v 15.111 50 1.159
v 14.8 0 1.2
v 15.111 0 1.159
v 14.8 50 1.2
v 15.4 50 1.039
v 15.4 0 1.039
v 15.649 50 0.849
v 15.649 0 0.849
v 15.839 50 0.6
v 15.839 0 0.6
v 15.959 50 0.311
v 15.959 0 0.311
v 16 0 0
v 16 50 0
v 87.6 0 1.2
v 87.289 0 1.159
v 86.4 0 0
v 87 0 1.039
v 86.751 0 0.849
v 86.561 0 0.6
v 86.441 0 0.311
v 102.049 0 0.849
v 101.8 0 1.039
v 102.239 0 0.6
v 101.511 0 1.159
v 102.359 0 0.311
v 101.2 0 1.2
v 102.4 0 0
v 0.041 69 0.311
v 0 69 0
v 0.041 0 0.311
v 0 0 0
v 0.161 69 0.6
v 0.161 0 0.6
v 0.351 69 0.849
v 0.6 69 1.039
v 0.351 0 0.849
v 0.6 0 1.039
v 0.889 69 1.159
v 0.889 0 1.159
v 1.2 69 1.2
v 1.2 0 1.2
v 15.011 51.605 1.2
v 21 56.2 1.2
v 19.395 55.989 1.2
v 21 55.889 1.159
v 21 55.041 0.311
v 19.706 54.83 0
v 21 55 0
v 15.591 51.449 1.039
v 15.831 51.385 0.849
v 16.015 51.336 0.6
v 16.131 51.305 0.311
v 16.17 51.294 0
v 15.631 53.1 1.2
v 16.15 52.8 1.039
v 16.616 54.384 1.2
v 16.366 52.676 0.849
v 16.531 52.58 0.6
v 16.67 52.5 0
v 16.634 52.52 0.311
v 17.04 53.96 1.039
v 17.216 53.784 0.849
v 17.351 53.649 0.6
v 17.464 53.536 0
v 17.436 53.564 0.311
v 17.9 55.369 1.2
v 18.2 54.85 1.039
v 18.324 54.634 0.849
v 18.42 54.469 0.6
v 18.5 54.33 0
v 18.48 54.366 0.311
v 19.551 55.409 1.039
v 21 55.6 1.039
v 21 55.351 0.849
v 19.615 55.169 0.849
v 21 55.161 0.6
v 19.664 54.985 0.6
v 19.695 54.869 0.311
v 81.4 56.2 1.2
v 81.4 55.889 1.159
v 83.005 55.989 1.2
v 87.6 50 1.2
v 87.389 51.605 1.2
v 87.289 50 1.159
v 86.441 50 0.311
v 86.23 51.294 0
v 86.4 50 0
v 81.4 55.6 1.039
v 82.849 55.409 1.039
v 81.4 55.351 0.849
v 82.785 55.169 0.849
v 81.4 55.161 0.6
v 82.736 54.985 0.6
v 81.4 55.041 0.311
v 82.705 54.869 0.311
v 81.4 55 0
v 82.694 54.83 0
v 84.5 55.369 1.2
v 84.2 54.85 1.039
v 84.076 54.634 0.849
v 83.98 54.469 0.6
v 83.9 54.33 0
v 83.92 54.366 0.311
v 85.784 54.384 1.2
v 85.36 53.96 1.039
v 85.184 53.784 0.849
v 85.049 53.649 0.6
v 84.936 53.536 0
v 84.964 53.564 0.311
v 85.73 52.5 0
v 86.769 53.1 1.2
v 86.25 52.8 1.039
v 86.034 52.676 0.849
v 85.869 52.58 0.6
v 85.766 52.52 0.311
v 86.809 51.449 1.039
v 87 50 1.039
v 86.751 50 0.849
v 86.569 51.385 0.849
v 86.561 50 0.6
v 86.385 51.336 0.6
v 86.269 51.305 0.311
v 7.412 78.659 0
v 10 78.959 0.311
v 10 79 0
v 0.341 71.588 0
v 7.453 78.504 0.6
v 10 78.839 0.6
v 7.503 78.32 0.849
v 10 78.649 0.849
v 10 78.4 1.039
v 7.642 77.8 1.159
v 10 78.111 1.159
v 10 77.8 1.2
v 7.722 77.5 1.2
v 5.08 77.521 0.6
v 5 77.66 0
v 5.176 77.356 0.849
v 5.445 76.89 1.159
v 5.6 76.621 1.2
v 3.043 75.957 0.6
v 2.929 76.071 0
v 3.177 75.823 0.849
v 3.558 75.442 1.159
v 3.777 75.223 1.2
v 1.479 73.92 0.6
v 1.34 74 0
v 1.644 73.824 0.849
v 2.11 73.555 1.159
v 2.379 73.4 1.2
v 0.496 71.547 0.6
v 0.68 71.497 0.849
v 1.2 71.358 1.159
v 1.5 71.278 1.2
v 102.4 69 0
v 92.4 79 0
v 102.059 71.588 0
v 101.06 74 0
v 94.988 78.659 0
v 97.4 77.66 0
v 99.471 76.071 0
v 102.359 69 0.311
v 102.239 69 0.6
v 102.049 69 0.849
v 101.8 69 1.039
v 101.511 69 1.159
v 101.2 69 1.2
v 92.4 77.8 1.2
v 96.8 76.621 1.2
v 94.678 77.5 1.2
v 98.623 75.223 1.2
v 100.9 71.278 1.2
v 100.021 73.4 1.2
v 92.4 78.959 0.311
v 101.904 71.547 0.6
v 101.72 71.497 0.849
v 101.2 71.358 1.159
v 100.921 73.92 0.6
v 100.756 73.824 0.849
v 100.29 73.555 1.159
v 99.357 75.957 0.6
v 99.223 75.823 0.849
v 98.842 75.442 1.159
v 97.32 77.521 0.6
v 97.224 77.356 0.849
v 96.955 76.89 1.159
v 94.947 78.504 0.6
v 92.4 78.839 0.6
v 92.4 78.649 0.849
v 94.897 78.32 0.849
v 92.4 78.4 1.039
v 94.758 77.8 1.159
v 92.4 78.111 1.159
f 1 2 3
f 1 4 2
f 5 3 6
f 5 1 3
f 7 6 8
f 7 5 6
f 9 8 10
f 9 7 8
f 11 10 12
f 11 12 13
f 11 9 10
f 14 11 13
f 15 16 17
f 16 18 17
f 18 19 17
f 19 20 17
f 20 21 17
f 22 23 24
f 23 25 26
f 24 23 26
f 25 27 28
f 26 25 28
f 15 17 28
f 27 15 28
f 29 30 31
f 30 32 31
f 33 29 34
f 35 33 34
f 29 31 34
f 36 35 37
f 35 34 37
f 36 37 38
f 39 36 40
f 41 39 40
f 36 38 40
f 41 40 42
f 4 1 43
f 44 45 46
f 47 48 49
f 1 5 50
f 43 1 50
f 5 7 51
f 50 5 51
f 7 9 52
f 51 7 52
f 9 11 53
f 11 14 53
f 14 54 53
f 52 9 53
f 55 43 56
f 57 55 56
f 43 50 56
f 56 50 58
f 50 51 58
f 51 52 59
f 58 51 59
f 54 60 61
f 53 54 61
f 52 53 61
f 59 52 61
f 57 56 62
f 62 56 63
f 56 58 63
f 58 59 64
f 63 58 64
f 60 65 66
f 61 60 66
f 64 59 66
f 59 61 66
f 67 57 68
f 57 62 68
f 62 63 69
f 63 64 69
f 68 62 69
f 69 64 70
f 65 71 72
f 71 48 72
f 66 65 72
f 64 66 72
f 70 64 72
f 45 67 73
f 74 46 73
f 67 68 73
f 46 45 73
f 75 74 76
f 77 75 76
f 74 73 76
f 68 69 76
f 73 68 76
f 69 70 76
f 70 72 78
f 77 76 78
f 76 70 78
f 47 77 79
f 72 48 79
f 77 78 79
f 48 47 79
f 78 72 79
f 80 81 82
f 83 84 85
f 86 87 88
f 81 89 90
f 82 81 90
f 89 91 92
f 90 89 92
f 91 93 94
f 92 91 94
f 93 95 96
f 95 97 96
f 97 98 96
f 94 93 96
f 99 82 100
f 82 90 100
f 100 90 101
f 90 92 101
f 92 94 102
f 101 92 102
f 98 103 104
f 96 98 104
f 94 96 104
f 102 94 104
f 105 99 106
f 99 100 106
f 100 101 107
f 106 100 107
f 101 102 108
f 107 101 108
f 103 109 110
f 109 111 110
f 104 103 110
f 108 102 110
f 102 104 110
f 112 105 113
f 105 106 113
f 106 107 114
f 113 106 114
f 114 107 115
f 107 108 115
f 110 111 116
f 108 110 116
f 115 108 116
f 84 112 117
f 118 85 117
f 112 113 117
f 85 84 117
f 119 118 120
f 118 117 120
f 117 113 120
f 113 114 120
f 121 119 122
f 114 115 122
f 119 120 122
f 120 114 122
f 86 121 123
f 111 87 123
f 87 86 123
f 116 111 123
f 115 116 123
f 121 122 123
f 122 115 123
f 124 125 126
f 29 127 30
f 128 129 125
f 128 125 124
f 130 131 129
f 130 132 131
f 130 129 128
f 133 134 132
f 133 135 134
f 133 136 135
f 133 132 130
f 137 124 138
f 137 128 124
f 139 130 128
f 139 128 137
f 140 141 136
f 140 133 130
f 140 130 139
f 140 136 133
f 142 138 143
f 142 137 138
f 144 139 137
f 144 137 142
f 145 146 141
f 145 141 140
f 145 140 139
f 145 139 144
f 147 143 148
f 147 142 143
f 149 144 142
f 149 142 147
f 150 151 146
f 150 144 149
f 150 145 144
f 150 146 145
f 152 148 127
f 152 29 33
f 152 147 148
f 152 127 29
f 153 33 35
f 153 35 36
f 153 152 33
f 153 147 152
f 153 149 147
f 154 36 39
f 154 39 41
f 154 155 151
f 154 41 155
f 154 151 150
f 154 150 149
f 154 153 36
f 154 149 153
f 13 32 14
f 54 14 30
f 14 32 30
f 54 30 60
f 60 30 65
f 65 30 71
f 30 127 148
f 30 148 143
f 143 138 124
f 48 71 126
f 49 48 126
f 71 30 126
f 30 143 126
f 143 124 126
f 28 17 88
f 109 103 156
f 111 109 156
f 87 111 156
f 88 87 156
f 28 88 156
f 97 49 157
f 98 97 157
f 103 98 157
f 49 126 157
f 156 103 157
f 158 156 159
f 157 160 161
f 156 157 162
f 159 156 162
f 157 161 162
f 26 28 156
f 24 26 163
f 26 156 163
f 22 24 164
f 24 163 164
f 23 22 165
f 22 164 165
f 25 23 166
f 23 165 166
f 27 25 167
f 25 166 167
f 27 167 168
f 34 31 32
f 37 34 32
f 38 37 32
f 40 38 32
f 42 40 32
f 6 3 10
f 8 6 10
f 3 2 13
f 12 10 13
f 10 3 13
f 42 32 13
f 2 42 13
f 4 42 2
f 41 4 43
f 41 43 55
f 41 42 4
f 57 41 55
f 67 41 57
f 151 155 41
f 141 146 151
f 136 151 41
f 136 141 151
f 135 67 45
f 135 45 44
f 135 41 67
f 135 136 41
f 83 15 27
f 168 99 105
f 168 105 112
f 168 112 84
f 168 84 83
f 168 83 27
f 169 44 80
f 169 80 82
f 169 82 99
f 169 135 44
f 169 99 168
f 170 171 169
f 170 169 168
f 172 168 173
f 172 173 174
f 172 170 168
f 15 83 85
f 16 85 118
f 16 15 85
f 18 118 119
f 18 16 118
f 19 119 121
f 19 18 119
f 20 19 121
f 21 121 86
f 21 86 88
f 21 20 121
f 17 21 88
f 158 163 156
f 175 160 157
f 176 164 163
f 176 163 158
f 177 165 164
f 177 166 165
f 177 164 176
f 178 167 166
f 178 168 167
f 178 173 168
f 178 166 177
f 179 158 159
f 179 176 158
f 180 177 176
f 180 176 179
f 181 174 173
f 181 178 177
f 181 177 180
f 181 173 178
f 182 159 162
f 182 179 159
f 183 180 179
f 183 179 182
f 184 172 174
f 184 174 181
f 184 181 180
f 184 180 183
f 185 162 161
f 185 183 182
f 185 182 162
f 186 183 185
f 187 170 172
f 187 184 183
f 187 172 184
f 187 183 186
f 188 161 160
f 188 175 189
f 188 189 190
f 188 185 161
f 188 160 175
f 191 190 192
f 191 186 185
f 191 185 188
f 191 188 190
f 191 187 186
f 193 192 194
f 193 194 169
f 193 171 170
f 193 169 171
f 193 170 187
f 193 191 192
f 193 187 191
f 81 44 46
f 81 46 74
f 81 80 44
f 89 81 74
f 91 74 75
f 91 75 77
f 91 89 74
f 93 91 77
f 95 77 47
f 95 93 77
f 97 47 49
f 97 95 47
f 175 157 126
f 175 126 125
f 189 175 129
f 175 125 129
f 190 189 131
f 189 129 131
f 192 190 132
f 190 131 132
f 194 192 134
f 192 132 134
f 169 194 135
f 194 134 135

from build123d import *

# Parameters (mm, degrees)
AUFSATZ_LINEAR_AUSTRAGEN1_DEPTH = 1.2
VERRUNDUNG1_R                   = 10
VERRUNDUNG2_R                   = 5
VERRUNDUNG3_R                   = 1.2
VERRUNDUNG4_R                   = 1.2


with BuildPart() as part:
    # Skizze1 → Aufsatz-Linear austragen1 (new body)
    with BuildSketch(Plane.XY):
        Polygon((0, 79), (0, 0), (16, 0), (16, 55), (86.4, 55), (86.4, 0), (102.4, 0), (102.4, 79), align=None)
    extrude(amount=AUFSATZ_LINEAR_AUSTRAGEN1_DEPTH)

    # Verrundung1
    verrundung1_edges = [part.edges().sort_by_distance(p)[0] for p in [
        (0, 79, 0.6),
        (102.4, 79, 0.6),
    ]]
    fillet(verrundung1_edges, radius=VERRUNDUNG1_R)

    # Verrundung2
    verrundung2_edges = [part.edges().sort_by_distance(p)[0] for p in [
        (86.4, 55, 0.6),
        (16, 55, 0.6),
    ]]
    fillet(verrundung2_edges, radius=VERRUNDUNG2_R)

    # Verrundung3
    verrundung3_edges = [part.edges().sort_by_distance(p)[0] for p in [
        (102.4, 34.5, 1.2),
        (99.471067812, 76.071067812, 1.2),
        (51.2, 79, 1.2),
        (2.928932188, 76.071067812, 1.2),
        (0, 34.5, 1.2),
    ]]
    fillet(verrundung3_edges, radius=VERRUNDUNG3_R - 0.0001)  # a hair under: the kernel refuses the full size

    # Verrundung4
    verrundung4_edges = [part.edges().sort_by_distance(p)[0] for p in [
        (16, 25, 1.2),
        (17.464466094, 53.535533906, 1.2),
        (86.4, 25, 1.2),
        (84.935533906, 53.535533906, 1.2),
        (51.2, 55, 1.2),
    ]]
    fillet(verrundung4_edges, radius=VERRUNDUNG4_R - 0.0001)  # a hair under: the kernel refuses the full size


solid = part.part
